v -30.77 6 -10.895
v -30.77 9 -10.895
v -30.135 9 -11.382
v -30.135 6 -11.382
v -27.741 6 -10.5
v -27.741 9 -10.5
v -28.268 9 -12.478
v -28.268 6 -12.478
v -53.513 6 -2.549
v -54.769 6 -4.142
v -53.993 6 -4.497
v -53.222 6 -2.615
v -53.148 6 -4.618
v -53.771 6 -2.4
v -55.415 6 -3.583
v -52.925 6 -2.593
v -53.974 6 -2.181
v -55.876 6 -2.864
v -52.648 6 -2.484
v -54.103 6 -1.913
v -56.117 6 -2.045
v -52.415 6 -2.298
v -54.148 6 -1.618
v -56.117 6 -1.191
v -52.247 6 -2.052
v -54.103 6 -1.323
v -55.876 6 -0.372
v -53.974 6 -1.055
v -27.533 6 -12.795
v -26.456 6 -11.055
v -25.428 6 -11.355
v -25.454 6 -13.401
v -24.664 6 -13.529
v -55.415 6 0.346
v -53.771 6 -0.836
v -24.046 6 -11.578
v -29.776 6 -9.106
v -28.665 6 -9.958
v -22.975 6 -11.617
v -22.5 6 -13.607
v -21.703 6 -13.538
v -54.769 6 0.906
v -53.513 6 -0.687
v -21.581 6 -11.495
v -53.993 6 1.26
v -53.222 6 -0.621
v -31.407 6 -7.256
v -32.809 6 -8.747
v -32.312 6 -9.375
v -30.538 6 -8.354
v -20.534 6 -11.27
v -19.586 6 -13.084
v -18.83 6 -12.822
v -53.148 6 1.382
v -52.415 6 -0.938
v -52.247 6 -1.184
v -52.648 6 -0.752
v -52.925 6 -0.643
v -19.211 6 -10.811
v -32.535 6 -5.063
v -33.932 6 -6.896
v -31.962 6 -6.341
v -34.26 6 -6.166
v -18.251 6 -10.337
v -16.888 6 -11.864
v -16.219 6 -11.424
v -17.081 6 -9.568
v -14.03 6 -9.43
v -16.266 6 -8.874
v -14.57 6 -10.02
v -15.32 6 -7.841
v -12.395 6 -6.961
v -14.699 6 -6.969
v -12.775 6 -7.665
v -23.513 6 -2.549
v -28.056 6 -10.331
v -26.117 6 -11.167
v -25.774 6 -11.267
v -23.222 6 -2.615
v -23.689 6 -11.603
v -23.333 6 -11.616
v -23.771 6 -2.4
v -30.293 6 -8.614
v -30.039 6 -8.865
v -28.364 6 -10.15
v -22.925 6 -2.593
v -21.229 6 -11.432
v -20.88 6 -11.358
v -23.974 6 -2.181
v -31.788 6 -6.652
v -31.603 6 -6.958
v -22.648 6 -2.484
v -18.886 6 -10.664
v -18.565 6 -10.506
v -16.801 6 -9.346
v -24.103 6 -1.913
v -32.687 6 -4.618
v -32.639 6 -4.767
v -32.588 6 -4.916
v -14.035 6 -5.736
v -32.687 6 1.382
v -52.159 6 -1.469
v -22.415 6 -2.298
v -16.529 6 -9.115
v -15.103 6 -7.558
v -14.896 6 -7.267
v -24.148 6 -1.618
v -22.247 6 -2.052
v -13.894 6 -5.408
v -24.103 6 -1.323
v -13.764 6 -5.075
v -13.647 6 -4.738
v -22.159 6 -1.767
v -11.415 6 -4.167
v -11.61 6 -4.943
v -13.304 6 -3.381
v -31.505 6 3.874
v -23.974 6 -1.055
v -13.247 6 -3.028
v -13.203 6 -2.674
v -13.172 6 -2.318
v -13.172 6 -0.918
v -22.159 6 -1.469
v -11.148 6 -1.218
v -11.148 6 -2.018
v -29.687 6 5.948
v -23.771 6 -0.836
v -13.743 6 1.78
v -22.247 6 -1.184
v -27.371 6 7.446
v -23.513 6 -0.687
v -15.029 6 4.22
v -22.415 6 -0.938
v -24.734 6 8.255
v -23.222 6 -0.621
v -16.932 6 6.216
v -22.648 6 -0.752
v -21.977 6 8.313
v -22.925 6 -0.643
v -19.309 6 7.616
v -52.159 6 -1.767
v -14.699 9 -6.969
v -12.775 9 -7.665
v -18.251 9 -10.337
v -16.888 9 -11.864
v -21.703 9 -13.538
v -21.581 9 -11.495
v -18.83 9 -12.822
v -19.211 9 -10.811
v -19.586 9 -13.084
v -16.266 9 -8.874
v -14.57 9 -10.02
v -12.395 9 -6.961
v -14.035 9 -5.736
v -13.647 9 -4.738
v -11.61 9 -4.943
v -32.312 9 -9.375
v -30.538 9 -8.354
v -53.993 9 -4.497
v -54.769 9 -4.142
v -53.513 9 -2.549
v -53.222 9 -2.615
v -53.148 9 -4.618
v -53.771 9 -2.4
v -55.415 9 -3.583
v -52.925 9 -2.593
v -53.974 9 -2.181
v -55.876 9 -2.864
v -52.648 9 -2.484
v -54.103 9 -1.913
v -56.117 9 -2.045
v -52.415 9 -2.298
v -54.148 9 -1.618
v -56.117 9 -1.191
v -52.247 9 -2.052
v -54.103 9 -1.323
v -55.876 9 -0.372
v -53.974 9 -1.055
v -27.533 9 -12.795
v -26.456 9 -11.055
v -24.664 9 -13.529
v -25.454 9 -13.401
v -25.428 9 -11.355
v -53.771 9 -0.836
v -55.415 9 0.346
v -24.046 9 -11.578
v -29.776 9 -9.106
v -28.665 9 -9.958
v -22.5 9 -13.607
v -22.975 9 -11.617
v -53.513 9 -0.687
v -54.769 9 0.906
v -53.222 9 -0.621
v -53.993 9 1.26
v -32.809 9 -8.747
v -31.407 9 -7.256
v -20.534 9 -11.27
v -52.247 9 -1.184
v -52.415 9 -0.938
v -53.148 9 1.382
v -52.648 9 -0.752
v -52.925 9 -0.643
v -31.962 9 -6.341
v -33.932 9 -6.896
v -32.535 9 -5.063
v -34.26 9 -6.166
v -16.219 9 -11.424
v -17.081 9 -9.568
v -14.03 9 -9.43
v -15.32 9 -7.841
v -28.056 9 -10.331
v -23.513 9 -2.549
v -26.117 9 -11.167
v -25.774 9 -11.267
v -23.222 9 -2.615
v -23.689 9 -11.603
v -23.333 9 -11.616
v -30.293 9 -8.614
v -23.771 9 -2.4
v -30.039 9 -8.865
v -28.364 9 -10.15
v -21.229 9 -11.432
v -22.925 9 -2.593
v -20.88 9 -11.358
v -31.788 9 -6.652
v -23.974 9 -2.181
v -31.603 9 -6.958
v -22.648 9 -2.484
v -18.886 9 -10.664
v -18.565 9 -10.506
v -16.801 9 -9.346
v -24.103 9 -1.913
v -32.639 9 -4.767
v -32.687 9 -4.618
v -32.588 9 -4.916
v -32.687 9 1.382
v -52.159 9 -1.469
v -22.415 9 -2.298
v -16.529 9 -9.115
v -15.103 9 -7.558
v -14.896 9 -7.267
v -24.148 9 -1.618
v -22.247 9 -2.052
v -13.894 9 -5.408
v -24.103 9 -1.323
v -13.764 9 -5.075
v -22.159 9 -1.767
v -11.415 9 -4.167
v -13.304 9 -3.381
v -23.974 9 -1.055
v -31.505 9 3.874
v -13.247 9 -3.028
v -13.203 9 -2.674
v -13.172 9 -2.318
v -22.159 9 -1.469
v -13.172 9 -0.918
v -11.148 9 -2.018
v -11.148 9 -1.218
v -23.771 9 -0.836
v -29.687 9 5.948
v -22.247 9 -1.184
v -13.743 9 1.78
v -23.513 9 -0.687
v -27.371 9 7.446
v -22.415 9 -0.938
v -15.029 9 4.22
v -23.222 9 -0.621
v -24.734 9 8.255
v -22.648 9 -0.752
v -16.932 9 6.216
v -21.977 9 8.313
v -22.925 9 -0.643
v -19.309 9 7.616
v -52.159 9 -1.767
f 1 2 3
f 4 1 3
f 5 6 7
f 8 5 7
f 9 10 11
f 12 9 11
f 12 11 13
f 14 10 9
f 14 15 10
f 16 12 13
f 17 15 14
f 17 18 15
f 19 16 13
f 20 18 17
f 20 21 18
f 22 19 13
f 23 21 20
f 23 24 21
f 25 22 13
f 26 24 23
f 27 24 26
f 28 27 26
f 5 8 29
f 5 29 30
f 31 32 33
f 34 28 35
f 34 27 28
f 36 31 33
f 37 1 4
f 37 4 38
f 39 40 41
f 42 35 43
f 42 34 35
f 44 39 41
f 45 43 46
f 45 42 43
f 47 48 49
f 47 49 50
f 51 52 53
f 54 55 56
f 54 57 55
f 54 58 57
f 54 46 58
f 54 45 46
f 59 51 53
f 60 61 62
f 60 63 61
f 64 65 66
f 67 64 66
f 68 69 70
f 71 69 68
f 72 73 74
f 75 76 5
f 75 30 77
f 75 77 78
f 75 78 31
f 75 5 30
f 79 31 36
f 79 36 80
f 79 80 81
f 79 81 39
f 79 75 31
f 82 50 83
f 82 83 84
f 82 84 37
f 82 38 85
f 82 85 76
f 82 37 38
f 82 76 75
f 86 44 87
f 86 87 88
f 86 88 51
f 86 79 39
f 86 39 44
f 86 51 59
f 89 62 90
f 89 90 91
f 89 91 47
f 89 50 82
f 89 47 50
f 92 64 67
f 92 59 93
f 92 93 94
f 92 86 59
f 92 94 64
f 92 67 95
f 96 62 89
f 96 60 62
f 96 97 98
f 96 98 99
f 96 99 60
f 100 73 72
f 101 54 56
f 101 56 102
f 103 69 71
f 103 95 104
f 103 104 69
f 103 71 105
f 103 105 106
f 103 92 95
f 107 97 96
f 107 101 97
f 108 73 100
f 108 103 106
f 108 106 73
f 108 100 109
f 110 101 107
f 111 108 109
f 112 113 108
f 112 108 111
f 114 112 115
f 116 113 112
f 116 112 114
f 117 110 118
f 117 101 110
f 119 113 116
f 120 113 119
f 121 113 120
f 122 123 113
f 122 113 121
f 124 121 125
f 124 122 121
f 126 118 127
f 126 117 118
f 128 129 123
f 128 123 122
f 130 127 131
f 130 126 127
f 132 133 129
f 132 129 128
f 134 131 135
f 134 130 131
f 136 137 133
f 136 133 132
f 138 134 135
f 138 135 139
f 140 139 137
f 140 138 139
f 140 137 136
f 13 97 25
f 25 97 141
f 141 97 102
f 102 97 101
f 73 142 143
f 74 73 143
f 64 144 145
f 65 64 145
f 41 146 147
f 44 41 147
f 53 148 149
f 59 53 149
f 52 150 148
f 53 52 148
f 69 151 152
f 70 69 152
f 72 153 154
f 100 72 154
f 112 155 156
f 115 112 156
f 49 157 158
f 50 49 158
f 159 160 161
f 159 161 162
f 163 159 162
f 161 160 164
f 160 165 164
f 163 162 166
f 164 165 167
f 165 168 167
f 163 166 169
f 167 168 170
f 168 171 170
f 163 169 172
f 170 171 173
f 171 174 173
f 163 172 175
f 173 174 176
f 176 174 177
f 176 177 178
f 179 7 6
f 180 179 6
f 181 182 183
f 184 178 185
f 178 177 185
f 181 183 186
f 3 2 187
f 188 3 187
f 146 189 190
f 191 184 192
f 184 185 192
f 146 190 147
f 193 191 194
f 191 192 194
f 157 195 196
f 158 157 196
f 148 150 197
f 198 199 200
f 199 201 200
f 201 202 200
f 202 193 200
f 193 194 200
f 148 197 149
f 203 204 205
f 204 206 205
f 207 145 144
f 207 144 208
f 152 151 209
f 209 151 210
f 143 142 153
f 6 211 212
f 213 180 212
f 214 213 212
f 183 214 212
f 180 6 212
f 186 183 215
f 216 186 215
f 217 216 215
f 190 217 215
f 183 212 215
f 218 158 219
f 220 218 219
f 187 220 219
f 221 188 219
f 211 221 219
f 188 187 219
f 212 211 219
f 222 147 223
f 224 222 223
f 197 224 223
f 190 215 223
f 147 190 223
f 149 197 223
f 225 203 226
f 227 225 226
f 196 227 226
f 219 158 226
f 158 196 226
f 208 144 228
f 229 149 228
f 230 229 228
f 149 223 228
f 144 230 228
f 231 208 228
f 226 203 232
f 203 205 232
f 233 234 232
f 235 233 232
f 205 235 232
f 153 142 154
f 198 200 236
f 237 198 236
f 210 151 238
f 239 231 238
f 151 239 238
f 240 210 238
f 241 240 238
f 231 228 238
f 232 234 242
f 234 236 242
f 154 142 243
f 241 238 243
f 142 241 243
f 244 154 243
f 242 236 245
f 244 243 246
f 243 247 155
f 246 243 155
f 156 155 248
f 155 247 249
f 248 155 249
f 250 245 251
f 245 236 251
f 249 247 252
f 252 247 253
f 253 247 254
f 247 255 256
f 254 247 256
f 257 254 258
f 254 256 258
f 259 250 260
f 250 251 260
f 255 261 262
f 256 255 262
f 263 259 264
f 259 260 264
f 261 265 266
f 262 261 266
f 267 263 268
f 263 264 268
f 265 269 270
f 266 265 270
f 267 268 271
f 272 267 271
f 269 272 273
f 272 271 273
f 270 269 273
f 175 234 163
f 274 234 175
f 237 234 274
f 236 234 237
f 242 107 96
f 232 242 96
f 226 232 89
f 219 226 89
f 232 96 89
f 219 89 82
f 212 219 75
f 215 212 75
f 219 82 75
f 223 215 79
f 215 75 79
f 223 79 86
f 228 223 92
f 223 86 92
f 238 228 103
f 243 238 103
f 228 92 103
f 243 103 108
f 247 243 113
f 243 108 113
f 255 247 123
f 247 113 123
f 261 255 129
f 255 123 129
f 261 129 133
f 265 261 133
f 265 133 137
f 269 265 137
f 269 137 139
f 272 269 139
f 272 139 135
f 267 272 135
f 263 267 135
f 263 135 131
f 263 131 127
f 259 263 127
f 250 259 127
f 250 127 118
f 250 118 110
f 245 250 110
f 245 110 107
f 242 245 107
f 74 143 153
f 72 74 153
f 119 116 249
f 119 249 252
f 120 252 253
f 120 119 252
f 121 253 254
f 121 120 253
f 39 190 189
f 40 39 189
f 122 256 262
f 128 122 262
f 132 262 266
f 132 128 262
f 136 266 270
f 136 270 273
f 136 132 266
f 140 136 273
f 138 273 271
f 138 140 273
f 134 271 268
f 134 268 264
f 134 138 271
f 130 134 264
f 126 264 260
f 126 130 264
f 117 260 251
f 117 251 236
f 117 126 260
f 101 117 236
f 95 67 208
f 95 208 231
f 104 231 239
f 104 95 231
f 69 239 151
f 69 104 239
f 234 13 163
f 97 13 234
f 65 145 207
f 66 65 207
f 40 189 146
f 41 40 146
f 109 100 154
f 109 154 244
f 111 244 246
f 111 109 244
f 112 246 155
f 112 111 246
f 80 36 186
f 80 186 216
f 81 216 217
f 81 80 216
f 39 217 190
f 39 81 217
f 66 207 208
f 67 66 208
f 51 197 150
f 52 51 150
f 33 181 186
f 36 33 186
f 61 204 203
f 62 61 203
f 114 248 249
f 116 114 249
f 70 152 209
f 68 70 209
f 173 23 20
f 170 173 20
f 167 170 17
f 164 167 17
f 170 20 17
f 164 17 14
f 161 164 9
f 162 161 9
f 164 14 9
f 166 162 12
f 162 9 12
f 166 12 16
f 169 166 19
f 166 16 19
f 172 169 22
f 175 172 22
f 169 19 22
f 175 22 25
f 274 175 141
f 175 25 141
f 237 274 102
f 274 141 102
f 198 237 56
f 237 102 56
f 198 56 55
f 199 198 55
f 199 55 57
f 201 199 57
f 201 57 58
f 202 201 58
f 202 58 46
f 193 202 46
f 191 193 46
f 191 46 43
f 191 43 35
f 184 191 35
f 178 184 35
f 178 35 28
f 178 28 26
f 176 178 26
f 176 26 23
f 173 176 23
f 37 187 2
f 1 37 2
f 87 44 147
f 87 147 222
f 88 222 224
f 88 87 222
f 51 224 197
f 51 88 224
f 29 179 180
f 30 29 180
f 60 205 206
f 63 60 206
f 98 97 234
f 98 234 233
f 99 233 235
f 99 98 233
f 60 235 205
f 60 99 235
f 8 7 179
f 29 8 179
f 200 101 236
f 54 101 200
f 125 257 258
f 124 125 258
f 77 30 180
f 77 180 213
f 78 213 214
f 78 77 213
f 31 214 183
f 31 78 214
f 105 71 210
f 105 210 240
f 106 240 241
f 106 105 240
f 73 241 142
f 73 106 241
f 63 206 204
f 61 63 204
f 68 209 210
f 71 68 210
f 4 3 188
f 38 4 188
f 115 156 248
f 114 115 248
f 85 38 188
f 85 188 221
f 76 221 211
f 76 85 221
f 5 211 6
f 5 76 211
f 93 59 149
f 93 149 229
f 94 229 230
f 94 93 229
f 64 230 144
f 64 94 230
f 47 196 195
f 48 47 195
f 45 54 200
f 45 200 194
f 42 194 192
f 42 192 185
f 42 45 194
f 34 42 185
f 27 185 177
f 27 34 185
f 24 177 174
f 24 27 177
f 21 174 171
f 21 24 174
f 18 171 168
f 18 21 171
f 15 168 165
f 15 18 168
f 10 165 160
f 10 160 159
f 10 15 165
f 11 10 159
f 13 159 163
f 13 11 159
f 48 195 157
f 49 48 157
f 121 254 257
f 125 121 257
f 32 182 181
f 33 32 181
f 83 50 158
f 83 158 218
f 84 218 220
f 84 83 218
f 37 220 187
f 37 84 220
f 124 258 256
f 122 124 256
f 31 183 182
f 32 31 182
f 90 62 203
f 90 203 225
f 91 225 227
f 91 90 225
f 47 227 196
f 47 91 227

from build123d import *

# Parameters (mm, degrees)
BOSS_EXTRUDE1_DEPTH   = 15
BOSS_EXTRUDE2_DEPTH   = 15
CIRPATTERN2_COUNT     = 13
CIRPATTERN2_ANGLE     = 170
F_1_0MM_DOWEL_HOLE1_D = 10
ESCALA1_SCALE         = 0.2


with BuildPart() as part:
    # Sketch1 → Boss-Extrude1 (new body)
    with BuildSketch(Plane(origin=(0, 0, 0), x_dir=(1, 0, 0), z_dir=(0, 1, 0))):
        with BuildLine():
            Line((-150, 15), (-47.696960071, 15))
            ThreePointArc((-47.696960071, 15), (50, 0), (-47.696960071, -15))
            Line((-47.696960071, -15), (-150, -15))
            ThreePointArc((-150, -15), (-165, 0), (-150, 15))
        make_face()
    extrude(amount=BOSS_EXTRUDE1_DEPTH)

    # Sketch2 → Boss-Extrude2 (add)
    with BuildSketch(Plane(origin=(0, 15, 0), x_dir=(1, 0, 0), z_dir=(0, 1, 0))):
        Polygon((49.877349569, 3.5), (60, 2), (60, -2), (49.877349569, -3.5), (50, 0), align=None)
    boss_extrude2 = extrude(amount=-BOSS_EXTRUDE2_DEPTH)

    # CirPattern2: Boss-Extrude2 ×13 about axis
    cirpattern2_axis = Axis((0, 0, 0), (0, 1, 0))
    for i in range(1, CIRPATTERN2_COUNT):
        add(boss_extrude2.rotate(cirpattern2_axis, i * CIRPATTERN2_ANGLE / (CIRPATTERN2_COUNT - 1)))

    # Ø1.0mm Dowel Hole1 (through all)
    with Locations(Plane(origin=(0, 15, 0), x_dir=(1, 0, 0), z_dir=(0, 1, 0))):
        with Locations((-150, 0), (0, 0)):
            Hole(F_1_0MM_DOWEL_HOLE1_D / 2)


with BuildPart() as part_1:
    # Escala1: scaled about (-28.934441086, 7.5, -2.022629068)
    add(part.part.scale(ESCALA1_SCALE).moved(Location((-23.147552869, 6, -1.618103254))))


solid = part_1.part
